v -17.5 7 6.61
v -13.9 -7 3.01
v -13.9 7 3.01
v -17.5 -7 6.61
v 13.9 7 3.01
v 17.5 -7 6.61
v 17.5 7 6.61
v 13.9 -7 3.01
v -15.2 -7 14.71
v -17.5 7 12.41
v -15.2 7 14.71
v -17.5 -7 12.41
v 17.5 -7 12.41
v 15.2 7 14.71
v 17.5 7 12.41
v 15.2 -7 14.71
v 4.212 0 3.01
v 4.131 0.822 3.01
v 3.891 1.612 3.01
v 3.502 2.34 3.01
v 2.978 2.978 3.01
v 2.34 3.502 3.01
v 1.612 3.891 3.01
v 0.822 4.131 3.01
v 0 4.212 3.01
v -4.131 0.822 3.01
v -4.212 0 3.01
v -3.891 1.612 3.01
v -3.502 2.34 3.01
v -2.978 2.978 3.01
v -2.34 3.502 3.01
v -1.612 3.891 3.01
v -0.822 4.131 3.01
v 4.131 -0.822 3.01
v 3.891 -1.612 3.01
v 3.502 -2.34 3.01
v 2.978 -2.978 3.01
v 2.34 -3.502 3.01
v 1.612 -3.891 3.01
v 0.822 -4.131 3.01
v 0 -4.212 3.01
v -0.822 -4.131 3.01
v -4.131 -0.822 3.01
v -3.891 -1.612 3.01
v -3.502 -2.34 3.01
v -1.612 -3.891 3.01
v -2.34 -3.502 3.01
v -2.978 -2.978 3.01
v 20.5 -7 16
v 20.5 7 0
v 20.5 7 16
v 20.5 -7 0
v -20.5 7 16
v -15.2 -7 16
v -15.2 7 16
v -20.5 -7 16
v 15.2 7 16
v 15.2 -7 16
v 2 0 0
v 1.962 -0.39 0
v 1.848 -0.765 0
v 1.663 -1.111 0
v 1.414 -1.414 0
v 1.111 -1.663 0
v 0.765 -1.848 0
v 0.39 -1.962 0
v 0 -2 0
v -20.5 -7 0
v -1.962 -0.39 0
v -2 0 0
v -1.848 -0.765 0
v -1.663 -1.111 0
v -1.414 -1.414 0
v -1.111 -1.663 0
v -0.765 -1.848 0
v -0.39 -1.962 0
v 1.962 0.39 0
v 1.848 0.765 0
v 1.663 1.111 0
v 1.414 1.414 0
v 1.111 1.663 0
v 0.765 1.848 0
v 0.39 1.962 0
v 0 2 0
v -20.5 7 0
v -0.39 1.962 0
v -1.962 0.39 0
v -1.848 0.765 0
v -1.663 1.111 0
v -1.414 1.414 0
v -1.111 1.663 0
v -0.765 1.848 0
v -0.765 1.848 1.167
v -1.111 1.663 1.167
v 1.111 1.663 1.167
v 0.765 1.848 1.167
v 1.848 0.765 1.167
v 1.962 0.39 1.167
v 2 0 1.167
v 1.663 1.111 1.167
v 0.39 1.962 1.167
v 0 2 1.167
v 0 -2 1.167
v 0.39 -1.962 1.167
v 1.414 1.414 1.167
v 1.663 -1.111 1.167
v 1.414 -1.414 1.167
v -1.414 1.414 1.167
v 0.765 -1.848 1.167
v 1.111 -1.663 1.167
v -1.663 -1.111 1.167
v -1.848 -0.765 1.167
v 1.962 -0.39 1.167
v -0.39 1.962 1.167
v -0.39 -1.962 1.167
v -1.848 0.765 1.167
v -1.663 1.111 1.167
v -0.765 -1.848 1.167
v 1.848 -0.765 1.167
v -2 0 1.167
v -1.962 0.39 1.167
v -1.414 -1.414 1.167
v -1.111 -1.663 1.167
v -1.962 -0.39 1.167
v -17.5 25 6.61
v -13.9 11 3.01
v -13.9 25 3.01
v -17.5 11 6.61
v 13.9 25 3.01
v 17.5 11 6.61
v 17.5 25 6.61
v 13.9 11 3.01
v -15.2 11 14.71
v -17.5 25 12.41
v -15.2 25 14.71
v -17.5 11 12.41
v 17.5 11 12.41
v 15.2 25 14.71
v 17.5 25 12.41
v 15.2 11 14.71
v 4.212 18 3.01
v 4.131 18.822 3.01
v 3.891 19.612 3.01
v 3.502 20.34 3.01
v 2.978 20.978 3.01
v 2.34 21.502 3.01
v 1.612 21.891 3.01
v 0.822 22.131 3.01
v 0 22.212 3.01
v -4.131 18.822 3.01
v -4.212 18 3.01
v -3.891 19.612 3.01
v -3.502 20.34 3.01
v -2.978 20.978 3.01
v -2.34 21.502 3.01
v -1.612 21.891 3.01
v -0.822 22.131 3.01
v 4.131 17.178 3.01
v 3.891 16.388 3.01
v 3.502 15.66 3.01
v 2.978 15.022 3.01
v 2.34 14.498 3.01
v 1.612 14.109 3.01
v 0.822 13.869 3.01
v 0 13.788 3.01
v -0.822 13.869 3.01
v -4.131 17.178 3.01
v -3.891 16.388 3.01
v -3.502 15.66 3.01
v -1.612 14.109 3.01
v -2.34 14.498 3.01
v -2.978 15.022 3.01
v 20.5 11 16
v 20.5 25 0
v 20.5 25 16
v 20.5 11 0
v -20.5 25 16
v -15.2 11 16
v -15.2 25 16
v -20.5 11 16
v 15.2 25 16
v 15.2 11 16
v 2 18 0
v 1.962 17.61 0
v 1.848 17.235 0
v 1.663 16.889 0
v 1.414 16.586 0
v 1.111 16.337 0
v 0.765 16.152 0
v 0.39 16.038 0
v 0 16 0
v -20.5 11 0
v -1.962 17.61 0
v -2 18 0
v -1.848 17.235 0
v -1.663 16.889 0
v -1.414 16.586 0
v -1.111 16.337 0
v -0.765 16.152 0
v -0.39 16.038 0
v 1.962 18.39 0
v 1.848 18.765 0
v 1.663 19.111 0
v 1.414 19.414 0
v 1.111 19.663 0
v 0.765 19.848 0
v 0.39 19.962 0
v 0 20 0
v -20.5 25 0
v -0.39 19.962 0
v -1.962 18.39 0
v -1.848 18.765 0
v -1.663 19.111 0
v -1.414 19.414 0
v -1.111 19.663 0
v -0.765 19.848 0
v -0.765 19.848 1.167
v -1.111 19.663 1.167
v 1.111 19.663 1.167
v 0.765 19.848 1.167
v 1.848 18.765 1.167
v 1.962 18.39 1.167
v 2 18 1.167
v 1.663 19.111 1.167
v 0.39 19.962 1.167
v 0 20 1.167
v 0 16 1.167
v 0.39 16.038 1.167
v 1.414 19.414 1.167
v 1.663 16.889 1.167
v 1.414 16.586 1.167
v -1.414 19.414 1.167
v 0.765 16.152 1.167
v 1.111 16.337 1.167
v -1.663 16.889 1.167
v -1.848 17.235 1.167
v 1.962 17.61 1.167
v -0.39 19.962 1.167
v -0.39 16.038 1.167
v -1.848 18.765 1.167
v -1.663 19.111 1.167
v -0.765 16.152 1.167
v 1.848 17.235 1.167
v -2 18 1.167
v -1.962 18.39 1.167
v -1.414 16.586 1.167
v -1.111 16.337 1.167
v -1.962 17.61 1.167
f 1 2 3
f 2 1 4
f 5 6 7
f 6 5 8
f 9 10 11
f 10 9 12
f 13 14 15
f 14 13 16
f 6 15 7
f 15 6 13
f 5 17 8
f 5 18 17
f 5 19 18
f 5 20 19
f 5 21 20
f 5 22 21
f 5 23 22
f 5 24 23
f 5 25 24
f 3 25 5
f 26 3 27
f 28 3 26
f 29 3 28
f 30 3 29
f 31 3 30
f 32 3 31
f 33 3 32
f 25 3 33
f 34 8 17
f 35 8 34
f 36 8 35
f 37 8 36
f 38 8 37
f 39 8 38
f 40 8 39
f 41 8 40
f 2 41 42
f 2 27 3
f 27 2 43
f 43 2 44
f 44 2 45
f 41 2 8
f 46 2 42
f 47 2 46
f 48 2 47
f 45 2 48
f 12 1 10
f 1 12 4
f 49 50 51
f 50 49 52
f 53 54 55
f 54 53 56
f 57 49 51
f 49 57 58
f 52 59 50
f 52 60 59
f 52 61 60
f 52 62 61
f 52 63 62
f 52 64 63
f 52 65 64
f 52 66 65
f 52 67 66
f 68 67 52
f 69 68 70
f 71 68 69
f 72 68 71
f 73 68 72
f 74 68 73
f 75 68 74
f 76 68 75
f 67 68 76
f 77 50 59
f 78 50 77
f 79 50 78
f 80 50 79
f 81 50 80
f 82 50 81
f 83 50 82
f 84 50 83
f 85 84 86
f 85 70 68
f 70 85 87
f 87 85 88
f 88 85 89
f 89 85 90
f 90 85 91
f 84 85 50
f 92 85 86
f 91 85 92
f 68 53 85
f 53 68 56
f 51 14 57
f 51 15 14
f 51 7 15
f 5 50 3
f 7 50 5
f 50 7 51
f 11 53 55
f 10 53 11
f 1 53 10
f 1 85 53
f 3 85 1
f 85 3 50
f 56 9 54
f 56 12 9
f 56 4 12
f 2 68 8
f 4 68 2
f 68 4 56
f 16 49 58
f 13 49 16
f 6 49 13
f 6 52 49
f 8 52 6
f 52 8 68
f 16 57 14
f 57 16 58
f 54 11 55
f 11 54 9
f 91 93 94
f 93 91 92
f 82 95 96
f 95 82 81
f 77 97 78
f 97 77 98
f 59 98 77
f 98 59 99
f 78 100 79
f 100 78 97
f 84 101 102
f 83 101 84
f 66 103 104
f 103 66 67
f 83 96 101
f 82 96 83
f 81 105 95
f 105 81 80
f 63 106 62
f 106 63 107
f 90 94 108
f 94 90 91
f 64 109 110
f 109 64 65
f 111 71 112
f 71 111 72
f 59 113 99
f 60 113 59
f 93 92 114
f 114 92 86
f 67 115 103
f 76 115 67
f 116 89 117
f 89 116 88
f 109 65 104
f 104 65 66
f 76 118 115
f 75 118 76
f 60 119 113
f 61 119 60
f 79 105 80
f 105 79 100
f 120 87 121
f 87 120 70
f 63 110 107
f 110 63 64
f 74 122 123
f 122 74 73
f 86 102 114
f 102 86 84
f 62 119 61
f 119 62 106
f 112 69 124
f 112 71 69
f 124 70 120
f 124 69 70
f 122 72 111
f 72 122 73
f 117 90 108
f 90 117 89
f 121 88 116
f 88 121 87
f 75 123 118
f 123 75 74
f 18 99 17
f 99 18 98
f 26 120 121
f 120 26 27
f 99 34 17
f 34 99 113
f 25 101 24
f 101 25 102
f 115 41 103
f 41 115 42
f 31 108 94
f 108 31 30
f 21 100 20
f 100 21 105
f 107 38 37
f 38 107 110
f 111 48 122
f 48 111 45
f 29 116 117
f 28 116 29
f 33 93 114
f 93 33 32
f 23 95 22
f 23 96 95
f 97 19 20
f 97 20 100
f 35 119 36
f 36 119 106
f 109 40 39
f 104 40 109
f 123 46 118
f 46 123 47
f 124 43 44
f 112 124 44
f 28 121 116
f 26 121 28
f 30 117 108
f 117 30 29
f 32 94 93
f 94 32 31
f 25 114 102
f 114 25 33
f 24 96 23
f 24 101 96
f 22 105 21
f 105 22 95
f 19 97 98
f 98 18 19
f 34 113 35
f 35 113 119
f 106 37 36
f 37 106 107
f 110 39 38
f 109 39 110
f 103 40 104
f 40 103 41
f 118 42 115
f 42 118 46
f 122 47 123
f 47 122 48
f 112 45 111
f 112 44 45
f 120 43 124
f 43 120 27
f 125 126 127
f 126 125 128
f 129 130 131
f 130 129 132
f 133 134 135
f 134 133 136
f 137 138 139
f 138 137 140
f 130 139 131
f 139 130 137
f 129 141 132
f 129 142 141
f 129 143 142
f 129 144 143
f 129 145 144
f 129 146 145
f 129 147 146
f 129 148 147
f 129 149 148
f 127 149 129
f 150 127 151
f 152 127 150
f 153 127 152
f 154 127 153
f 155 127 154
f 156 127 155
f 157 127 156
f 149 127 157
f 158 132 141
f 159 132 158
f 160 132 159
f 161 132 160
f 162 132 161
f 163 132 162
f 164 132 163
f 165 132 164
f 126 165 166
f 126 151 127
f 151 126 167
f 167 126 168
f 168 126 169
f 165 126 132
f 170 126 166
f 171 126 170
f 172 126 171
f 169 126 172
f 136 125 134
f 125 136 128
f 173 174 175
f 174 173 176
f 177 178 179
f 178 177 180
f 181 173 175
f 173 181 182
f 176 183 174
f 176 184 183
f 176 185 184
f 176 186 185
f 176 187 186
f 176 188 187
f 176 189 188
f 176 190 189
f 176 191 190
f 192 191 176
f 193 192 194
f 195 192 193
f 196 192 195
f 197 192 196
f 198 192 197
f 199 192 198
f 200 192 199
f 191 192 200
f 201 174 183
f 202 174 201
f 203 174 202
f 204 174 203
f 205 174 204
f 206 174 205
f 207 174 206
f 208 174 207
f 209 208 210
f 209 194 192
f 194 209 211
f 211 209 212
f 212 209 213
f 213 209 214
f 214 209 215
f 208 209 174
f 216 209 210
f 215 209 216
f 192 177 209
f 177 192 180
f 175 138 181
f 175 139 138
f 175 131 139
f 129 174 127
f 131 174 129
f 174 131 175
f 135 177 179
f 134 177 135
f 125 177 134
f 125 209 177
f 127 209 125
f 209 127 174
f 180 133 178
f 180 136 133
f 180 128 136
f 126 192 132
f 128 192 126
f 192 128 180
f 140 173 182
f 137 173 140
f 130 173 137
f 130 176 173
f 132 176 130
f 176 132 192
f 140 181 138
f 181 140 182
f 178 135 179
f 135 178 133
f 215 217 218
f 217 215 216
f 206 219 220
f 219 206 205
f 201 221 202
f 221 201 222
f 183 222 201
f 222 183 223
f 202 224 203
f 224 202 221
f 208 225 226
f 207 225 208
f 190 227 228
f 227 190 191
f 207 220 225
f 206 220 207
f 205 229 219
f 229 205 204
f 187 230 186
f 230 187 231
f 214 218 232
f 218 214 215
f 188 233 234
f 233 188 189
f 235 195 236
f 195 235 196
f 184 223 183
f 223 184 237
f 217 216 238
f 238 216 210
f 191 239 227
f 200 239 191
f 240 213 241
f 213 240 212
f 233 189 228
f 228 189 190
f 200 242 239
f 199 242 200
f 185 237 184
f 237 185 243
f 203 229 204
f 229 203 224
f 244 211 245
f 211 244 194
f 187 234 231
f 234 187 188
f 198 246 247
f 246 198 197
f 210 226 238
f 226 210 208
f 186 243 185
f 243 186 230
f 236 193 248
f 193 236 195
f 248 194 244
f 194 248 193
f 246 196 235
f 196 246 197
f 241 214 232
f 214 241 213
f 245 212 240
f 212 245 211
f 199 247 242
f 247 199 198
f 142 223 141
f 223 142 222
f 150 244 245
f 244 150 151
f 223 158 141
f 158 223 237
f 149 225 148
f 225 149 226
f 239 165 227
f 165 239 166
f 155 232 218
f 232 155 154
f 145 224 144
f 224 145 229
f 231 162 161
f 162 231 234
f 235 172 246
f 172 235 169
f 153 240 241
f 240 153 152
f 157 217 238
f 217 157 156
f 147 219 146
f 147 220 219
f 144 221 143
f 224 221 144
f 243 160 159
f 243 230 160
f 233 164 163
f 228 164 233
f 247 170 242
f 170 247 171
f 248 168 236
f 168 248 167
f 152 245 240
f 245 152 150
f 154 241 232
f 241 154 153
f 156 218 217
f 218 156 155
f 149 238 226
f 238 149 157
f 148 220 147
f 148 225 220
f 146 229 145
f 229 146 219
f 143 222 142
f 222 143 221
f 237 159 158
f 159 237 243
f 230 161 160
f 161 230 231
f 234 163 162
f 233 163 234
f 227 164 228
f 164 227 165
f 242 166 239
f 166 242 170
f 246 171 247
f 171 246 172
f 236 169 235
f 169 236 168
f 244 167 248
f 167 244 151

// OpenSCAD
$fn=32;

wall = 3;
inner_width = 35;
outer_width = inner_width + 2*wall;
total_len = 14;
base_height = wall;
inner_height = 13;
outer_height = inner_height+1*base_height;

/*
  ChamferZCube(w=1,h=10)

  A cube, which can be used to chamfer along the z axis

  Args:
    w: The width of the cube is sqrt(2)*w
    h: Height of the cube
    d: The cube has a descent below z=0 plane and an ascent beyond h by this value
  Notes:
    The cube is centered around z-axsis and placed on z=0 plane.

*/
module ChamferZCube(w=1,h=10, d=0) {
  translate([0,0,h/2])
  rotate([0,0,45])
  cube([sqrt(2)*w,sqrt(2)*w,h+2*d], center=true);
}

module ChamferXCube(w=1,h=10, d=0) {
  rotate([45,0,0])
  cube([h+2*d,sqrt(2)*w,sqrt(2)*w], center=true);
}

module ChamferYCube(w=1,h=10, d=0) {
  rotate([0,45,0])
  cube([sqrt(2)*w,h+2*d,sqrt(2)*w], center=true);
}


/*
  CenterCube(dim, ChamferBody = 0, ChamferBottom=0, ChamferTop=0)

  A cube which is centered along z axis but is placed on z=0 plane
  Optionally allows chamfer along z axis.

  Args:
    dim: Same as for cube(dim)
    ChamferBody: The amount to chamfer for edges parallel to z axis
    ChamferBottom: The amount to chamfer for edges in z=0 plane
    ChamferTop: The amount to chamfer for edges in z=dim[2] plane
  Example:
    CenterCube([10, 20, 5]);

    // create a rectangle bowl
    // thanks to chamfer no support is required with 3d print
    difference() {  
      wallthickness=2;
      xwidth = 10;
      ywidth = 20;
      height = 5;
      CenterCube( 
        [xwidth+2*wallthickness, ywidth+2*wallthickness, height], 
        ChamferBottom = wallthickness);
      translate([0,0,wallthickness])
      CenterCube([xwidth,ywidth,height]);
    }

*/

module CenterCube(dim, ChamferBody = 0, ChamferBottom=0, ChamferTop=0) {
  difference() {
    translate([0,0,dim[2]/2])
    cube(dim, center=true);

    if ( ChamferBody > 0 ) {
      translate([dim[0]/2,dim[1]/2,0])
      ChamferZCube(w=ChamferBody,h=dim[2],d=0.01);
      
      translate([-dim[0]/2,dim[1]/2,0])
      ChamferZCube(w=ChamferBody,h=dim[2],d=0.01);

      translate([-dim[0]/2,-dim[1]/2,0])
      ChamferZCube(w=ChamferBody,h=dim[2],d=0.01);

      translate([dim[0]/2,-dim[1]/2,0])
      ChamferZCube(w=ChamferBody,h=dim[2],d=0.01);
    }
    
    if ( ChamferBottom > 0 )
    {
      translate([-dim[0]/2,0,0])
      ChamferYCube(w=ChamferBottom,h=dim[1],d=0.01);

      translate([dim[0]/2,0,0])
      ChamferYCube(w=ChamferBottom,h=dim[1],d=0.01);

      translate([0,-dim[1]/2,0])
      ChamferXCube(w=ChamferBottom,h=dim[0],d=0.01);

      translate([0,dim[1]/2,0])
      ChamferXCube(w=ChamferBottom,h=dim[0],d=0.01);
    }
    
    if ( ChamferTop > 0 )
    {
      translate([-dim[0]/2,0,dim[2]])
      ChamferYCube(w=ChamferTop,h=dim[1],d=0.01);

      translate([dim[0]/2,0,dim[2]])
      ChamferYCube(w=ChamferTop,h=dim[1],d=0.01);

      translate([0,-dim[1]/2,dim[2]])
      ChamferXCube(w=ChamferTop,h=dim[0],d=0.01);

      translate([0,dim[1]/2,dim[2]])
      ChamferXCube(w=ChamferTop,h=dim[0],d=0.01);
    }
  }
}


module holder() {
  difference() {
    CenterCube([outer_width, total_len, outer_height]);
    translate([0,0,base_height+0.01])
    CenterCube([inner_width, 2*total_len, inner_height], ChamferBottom=3.6, ChamferTop=3.6);
    translate([0,0,base_height+inner_height/2])
    CenterCube([inner_width-4.6, 2*total_len, inner_height]);

    cylinder(d=4,h=base_height*3, center=true);
    
    translate([0,0,-0.5])
    cylinder(d1=0, d2=12, h=5);
  }
}

holder();
translate([0, total_len+4, 0])
holder();
